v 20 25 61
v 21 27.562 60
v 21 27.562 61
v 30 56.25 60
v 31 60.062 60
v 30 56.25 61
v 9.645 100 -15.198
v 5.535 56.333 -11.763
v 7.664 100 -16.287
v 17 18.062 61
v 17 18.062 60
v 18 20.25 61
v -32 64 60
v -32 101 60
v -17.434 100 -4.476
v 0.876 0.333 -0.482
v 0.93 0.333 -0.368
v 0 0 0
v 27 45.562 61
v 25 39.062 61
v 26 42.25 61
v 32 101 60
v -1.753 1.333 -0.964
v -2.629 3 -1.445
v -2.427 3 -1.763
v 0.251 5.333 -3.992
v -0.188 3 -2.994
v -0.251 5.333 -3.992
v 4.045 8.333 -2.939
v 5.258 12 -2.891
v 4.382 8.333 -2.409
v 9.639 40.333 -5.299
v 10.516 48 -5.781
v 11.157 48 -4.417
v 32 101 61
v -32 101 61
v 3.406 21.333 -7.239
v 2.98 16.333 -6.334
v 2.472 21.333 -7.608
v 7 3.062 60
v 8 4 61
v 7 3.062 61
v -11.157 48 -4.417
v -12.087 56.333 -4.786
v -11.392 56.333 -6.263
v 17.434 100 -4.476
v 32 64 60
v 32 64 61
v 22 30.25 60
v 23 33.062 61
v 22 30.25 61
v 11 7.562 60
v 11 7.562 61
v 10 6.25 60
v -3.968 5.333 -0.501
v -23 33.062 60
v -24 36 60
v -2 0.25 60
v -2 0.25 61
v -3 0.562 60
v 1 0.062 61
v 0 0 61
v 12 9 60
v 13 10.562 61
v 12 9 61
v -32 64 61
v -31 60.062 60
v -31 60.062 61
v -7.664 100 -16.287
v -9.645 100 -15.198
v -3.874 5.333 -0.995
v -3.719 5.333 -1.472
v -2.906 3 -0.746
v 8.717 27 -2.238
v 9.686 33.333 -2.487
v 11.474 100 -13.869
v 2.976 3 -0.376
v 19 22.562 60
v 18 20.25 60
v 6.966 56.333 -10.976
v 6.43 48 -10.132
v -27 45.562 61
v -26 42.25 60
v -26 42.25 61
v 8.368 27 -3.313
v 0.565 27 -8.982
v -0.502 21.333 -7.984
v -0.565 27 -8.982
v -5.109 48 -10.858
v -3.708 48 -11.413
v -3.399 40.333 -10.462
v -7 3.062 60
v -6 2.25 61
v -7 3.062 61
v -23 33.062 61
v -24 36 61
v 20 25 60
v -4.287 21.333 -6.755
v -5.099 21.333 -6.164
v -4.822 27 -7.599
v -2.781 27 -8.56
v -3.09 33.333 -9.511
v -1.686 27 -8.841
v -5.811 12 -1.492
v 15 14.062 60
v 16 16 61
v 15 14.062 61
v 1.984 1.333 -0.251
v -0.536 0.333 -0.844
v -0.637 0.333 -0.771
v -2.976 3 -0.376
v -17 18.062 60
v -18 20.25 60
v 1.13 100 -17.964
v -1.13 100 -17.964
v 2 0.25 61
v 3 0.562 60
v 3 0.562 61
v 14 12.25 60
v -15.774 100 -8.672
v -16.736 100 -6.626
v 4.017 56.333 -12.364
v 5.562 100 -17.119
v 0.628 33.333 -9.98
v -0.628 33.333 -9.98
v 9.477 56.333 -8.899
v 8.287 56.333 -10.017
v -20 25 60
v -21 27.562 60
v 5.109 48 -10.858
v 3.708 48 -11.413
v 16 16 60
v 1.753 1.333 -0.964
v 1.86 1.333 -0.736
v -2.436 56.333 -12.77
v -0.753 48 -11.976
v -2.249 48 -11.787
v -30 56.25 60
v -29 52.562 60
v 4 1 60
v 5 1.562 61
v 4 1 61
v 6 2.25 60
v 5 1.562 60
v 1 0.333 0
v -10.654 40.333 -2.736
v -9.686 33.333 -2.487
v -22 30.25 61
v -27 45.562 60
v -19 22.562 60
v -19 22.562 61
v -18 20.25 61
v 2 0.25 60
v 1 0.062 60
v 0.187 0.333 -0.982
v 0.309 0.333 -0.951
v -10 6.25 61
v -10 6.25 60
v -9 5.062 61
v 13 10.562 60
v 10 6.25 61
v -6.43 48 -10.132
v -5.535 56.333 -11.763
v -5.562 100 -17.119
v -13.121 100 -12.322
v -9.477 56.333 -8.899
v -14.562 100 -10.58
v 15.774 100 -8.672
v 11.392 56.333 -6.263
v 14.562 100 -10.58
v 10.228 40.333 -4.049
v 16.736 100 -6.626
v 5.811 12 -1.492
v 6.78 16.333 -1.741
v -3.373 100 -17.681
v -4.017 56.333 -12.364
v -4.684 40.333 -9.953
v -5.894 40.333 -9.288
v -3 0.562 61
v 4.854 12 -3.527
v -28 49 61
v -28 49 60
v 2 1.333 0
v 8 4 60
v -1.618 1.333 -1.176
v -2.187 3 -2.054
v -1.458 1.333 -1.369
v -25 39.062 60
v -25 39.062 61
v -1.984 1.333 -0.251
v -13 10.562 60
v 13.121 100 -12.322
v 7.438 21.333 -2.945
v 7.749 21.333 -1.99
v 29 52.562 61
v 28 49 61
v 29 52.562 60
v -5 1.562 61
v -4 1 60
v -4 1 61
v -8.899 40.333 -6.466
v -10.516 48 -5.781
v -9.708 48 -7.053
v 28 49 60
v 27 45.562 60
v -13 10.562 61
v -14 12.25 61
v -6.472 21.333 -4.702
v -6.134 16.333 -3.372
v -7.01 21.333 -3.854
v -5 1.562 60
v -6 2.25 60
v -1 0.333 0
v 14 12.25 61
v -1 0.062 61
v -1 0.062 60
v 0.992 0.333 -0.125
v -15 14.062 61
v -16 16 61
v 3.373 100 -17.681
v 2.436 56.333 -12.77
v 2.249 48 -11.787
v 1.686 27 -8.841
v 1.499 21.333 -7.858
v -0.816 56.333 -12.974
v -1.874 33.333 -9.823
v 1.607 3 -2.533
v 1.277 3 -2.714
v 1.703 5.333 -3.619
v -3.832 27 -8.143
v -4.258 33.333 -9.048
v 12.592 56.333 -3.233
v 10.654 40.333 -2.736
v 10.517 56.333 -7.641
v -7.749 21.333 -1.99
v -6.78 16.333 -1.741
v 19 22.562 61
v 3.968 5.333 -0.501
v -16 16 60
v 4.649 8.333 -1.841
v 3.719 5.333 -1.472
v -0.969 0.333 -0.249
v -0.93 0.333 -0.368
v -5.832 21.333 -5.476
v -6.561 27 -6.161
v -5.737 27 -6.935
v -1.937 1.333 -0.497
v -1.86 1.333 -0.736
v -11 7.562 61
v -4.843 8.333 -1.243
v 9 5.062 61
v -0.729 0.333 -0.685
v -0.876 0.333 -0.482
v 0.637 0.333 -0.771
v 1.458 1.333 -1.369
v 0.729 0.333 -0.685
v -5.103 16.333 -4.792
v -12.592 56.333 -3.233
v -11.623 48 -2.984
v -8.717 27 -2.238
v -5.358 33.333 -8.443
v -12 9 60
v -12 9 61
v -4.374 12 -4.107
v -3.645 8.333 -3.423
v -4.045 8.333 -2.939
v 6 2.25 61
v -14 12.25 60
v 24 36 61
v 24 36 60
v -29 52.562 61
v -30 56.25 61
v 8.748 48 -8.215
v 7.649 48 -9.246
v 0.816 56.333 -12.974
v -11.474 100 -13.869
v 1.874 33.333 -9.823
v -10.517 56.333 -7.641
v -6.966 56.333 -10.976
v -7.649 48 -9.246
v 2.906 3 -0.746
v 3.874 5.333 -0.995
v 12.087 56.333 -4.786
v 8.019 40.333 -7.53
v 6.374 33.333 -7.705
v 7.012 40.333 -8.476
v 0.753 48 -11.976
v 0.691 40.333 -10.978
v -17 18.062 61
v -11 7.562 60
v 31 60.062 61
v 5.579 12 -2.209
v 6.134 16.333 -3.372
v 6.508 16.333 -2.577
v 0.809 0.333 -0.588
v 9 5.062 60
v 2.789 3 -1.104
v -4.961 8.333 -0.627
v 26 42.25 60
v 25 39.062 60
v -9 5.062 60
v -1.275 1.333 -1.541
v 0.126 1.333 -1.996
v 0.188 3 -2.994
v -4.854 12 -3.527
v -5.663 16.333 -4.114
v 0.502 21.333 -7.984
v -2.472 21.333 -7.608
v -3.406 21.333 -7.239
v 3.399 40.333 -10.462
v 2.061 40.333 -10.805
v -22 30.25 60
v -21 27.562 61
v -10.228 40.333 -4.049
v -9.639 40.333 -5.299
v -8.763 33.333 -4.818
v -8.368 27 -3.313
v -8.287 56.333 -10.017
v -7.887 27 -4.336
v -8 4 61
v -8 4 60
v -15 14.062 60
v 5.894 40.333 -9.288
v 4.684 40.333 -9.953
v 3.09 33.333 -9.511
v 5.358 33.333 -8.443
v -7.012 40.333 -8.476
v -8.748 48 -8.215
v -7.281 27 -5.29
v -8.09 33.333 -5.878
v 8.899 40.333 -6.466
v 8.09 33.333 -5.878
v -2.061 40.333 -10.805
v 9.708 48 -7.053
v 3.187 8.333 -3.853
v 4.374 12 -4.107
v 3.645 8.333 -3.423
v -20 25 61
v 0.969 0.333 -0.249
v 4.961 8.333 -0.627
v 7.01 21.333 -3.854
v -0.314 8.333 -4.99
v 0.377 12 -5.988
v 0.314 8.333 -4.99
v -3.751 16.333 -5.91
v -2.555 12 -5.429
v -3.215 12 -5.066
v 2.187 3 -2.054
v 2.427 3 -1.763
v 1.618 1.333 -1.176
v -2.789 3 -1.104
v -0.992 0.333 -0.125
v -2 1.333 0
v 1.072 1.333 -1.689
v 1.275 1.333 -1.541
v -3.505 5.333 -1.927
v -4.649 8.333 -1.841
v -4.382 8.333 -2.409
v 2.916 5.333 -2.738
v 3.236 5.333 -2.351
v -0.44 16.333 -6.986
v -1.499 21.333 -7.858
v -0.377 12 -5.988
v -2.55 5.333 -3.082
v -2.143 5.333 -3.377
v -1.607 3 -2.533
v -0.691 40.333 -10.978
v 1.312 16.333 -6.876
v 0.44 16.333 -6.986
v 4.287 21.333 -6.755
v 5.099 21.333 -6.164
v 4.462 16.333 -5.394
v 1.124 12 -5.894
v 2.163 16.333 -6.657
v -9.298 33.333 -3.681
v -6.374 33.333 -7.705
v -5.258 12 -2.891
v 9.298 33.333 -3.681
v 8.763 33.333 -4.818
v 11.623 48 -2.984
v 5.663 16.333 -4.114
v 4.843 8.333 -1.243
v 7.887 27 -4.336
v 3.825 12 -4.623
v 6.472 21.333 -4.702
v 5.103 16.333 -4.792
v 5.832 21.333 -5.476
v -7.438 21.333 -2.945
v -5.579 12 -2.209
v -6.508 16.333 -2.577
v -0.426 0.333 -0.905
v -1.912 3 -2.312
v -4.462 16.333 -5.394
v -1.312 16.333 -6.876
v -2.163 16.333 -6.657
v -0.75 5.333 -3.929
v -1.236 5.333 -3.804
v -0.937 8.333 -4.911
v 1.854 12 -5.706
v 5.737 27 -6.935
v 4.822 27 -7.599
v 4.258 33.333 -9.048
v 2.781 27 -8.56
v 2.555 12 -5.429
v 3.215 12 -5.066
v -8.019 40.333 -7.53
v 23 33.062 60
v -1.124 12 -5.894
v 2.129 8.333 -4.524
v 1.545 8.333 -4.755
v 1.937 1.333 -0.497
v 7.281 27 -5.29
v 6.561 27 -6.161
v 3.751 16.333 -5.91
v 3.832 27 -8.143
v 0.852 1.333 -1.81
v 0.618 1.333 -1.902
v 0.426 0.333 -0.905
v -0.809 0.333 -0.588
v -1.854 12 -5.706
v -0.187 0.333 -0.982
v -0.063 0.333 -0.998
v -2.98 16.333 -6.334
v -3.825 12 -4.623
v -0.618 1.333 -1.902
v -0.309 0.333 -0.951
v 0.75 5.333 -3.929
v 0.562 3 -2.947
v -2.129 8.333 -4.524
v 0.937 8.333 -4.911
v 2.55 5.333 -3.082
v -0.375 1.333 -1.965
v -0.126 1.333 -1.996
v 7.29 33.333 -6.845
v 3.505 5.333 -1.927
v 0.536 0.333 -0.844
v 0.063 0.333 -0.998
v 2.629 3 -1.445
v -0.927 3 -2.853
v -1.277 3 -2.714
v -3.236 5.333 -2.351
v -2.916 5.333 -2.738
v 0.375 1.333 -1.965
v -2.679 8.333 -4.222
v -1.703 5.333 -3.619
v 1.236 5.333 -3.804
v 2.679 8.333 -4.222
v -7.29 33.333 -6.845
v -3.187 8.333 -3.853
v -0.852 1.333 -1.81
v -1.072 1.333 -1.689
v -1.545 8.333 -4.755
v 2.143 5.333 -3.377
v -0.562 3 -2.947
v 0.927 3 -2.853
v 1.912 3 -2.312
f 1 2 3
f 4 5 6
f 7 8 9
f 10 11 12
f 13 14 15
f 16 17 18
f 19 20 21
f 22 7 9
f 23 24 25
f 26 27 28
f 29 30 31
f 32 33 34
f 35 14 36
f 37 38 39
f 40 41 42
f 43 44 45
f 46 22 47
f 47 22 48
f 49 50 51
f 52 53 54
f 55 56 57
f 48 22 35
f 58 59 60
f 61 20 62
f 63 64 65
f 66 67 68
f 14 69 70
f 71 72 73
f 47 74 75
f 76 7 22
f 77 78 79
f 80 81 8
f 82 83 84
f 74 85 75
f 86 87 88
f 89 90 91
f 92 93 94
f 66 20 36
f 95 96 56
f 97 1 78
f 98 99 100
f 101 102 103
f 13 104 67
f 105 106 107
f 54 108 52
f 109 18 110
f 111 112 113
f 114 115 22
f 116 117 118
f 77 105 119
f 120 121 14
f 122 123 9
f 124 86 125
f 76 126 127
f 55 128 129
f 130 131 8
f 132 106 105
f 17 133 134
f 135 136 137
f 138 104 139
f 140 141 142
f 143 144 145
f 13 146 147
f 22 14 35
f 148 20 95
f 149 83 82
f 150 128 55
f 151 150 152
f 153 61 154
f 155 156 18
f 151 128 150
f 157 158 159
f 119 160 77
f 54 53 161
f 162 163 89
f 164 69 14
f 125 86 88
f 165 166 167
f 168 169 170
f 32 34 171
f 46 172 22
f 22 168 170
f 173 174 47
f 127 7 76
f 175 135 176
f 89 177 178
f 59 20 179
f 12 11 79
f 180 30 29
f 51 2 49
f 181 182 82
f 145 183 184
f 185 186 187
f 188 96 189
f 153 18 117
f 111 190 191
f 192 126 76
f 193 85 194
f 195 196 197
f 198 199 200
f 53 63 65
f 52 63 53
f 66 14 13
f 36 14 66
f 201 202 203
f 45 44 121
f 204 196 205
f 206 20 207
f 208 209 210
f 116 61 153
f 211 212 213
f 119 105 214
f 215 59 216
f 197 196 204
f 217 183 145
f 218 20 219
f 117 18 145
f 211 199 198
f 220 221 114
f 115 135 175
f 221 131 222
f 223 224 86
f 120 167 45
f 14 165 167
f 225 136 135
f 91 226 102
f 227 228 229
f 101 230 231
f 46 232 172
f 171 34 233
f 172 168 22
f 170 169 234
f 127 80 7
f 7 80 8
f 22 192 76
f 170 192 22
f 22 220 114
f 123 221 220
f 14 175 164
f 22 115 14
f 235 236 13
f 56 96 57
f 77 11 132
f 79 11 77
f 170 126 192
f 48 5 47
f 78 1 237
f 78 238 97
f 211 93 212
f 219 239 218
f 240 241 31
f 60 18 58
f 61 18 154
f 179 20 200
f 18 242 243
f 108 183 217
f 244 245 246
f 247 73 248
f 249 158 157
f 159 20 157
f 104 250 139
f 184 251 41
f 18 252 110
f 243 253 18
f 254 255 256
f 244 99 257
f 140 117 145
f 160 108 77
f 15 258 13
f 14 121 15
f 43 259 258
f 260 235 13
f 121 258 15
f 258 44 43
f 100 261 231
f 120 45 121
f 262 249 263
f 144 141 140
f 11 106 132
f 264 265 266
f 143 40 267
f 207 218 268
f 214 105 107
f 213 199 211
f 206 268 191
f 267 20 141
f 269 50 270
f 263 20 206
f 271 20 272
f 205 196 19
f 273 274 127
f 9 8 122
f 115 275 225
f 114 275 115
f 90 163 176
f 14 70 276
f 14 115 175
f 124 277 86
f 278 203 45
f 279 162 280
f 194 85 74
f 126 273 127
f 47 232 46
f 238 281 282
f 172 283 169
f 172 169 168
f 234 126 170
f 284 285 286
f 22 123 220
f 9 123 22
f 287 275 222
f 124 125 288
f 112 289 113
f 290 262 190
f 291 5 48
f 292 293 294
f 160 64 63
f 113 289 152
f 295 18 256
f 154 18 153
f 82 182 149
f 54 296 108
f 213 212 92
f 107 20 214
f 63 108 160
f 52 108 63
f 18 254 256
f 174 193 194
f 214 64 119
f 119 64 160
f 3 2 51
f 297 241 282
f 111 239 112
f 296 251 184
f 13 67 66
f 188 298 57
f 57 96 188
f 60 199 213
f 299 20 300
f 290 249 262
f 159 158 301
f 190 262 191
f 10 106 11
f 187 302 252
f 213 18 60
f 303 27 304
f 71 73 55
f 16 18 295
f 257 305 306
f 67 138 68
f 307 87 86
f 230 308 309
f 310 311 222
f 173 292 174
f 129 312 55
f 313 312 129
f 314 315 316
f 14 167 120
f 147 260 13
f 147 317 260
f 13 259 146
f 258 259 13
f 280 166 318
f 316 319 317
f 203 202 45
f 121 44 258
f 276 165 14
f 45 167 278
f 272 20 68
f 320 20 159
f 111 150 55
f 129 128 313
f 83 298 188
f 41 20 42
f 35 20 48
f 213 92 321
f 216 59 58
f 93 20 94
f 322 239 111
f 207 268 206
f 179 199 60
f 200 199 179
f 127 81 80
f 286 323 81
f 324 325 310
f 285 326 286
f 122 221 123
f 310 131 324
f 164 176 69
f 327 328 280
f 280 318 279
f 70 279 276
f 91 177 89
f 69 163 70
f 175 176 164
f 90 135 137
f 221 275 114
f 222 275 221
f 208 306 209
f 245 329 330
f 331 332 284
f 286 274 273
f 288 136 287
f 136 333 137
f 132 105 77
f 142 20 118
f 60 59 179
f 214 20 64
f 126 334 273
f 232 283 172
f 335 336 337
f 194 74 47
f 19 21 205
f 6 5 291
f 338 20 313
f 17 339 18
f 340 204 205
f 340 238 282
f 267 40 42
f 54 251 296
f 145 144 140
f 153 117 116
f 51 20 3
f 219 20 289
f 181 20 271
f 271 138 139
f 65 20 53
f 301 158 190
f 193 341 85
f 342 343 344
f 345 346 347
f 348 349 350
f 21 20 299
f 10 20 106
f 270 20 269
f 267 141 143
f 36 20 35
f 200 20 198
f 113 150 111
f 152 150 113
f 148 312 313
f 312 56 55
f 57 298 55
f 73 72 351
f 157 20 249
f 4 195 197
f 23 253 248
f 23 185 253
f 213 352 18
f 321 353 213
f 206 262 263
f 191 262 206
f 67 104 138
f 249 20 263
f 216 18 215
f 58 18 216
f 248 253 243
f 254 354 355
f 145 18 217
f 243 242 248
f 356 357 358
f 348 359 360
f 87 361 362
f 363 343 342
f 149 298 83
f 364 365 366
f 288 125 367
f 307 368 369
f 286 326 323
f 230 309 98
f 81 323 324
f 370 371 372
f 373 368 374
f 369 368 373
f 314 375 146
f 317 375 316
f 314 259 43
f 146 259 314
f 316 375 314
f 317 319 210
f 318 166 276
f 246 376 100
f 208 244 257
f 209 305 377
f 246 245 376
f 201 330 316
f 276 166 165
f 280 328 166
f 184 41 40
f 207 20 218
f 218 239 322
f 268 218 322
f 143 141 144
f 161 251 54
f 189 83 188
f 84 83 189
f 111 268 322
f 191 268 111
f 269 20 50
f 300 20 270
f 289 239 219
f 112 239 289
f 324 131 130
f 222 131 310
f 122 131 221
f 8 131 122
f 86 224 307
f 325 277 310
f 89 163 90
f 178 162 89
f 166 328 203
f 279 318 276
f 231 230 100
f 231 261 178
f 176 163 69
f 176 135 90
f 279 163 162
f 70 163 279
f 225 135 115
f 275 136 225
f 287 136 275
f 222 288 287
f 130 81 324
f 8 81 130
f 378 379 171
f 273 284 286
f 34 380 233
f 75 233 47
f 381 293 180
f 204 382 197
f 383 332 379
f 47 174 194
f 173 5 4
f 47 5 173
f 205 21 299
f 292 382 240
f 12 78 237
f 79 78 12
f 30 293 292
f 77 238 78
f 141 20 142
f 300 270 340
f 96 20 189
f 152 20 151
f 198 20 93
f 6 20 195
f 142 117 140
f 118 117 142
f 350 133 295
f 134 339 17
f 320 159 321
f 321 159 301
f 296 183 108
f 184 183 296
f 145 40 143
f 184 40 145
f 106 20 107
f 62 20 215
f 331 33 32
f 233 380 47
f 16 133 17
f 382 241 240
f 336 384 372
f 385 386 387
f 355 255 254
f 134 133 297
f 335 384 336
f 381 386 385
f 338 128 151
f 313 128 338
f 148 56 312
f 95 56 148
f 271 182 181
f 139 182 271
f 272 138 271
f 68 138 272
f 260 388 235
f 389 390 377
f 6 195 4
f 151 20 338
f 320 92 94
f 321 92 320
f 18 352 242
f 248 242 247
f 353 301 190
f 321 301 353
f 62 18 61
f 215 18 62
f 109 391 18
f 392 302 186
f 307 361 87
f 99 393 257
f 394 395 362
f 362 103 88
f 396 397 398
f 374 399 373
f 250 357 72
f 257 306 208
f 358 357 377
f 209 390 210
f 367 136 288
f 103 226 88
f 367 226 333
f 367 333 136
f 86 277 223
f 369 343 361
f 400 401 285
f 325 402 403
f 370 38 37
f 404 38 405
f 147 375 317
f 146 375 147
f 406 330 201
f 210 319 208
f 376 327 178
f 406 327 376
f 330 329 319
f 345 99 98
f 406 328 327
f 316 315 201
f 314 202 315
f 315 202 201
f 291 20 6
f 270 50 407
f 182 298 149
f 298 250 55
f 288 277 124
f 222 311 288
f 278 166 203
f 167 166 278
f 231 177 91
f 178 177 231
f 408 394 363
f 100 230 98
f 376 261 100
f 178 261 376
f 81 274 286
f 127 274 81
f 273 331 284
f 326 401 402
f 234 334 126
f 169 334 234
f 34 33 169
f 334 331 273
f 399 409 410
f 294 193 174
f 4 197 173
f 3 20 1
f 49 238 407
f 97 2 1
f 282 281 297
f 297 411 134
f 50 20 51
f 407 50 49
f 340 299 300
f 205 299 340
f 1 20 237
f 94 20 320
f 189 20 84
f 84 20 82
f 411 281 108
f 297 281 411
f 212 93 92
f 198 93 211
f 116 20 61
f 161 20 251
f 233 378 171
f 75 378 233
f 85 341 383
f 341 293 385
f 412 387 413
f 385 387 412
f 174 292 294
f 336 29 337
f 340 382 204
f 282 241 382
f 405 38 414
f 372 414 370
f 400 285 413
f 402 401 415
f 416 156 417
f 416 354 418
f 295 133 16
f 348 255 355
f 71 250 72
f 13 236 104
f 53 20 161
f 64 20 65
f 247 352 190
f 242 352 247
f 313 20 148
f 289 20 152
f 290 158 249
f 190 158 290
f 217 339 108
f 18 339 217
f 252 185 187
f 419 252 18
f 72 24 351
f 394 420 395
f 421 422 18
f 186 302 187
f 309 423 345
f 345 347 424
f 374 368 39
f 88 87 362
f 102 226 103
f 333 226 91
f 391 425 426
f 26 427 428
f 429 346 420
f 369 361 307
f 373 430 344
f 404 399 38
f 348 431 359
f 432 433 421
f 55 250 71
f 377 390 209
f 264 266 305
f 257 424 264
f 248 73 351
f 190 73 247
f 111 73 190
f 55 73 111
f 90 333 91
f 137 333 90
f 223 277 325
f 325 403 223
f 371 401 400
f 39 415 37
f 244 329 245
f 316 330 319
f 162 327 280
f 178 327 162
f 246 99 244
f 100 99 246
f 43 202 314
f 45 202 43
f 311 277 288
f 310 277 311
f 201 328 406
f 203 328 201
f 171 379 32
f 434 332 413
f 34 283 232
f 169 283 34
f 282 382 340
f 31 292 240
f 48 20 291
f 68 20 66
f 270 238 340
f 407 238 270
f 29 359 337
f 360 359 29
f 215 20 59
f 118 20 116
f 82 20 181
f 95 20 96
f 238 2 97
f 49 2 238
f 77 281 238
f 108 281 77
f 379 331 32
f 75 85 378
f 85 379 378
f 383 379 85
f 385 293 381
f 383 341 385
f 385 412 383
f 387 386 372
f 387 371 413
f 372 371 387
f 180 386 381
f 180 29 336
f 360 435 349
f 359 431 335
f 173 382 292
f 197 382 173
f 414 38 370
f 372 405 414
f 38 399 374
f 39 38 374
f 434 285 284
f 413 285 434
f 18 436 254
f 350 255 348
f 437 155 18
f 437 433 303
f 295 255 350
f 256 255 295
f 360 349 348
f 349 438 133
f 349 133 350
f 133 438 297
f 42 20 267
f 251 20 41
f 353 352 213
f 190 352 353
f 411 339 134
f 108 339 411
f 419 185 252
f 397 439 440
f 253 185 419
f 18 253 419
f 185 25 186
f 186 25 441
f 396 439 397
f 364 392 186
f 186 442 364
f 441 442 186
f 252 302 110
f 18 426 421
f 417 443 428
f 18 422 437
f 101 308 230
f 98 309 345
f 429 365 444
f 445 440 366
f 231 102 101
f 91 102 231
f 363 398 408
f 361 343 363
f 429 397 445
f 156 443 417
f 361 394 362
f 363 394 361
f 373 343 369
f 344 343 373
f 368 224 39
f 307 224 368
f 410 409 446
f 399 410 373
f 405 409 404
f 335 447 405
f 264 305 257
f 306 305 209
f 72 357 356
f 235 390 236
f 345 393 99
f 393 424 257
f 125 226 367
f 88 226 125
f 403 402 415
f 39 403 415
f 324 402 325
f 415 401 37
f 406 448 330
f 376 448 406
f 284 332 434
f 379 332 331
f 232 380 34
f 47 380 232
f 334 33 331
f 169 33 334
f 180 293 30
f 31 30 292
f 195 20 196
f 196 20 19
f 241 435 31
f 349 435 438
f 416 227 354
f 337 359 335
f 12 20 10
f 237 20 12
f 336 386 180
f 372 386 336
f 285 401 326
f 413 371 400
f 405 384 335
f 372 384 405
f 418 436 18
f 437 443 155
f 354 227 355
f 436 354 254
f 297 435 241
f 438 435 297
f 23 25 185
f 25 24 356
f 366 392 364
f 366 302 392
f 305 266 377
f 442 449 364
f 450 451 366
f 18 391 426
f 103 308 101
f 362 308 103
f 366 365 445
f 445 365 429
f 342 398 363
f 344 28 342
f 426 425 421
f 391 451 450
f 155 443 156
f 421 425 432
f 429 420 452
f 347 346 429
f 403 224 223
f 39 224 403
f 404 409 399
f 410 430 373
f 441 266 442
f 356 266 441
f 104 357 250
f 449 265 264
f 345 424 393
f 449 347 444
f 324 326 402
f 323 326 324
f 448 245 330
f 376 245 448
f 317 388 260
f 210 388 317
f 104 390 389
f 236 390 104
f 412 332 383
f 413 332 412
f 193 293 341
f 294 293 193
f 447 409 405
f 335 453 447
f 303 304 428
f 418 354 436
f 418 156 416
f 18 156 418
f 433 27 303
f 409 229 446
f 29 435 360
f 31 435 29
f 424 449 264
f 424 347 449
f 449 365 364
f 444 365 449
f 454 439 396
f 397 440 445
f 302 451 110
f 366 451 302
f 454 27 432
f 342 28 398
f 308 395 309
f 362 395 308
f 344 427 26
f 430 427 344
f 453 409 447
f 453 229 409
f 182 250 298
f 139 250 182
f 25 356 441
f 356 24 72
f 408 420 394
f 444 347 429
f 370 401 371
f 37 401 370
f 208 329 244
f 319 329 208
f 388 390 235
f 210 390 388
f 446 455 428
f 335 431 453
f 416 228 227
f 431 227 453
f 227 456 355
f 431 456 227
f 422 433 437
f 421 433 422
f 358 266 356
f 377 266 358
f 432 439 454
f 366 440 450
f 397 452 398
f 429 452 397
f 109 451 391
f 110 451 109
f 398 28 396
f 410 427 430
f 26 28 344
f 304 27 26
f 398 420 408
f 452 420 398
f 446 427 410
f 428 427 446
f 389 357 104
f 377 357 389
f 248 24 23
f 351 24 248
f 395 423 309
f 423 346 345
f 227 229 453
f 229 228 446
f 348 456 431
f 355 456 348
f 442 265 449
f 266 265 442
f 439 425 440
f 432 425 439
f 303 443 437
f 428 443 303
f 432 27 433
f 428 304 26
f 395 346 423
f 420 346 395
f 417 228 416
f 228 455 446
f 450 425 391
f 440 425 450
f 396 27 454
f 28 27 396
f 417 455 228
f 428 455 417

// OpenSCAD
// file: variables.scad
// ##########################################//
// General
// ##########################################//
$fn = 50;
DIFFERENCE_FIX = 0.1;
DIFFERENCE_FIX_NEGATIVE = -1 * DIFFERENCE_FIX;
DIFFERENCE_FIX_2 = 2 * DIFFERENCE_FIX;

// ##########################################//
// Nose
// ##########################################//
noseTopThickness = 1;
noseTopOffsetZ = 60;
noseHeight = noseTopOffsetZ + noseTopThickness;
noseLength = 100;
noseTopEndOffset = 20;
noseTopSharpnessFactor = 4;
noseBotttomSharpnessFactor = 3;
noseTopThicknessFactor = 1;
noseBottomThicknessFactor = 3;

// ##########################################//
// Hull
// ##########################################//
hullThickness = 3;
hullWidth = 70 - hullThickness * 2;
hullLength = 500 - hullThickness * 2;
hullHeight = noseHeight + hullThickness;
hullSpacing = 100;
hullCutoutWidth = 46;
hullCutoutHeight = 150;

// ##########################################//
// Hull Mounts
// ##########################################//
hullMountHoleRadius = 4.25;
hullMountHeight = 20;
hullMountWidth = 20;
hullMountDepth = 50;
hullMountOffsetY = 100;

// ##########################################//
// Rod Connectors
// ##########################################//
rodConnectorWidth = 20;
rodConnectorRadius = 10;
rodConnectorTopOffset = 3;

// ##########################################//
// Lid
// ##########################################//
lidLip = 5;
lidThickness = 3;
lidGap = 0.4;
lidText = "+1 555 123 1234";
lidTextOffsetX = 28;
lidTextOffsetY = 20;

// ##########################################//
// Motor mount
// ##########################################//
motorMountMotorRadius = 35;
motorMountMotorDepth = 100;
motorMountThickness = 4;
motorMountMountThickness = 5;
motorMountMountOffsetX = 20;
motorMountSupportHeight = 10;
motorMountSupportExtensionY = 30;
motorMountOffsetY = 300;
motorMountRudderSupportHeight = 5;
motorMountRudderSupportWidth = 10;
motorMountRudderSupportExtensionY = 20;


// ##########################################//
// Rudder
// ##########################################//
rudderHeight = motorMountMotorRadius * 2 - 10;
rudderWidth = 60;
rudderThickness = 3;
rudderMountTopHeight = motorMountRudderSupportHeight + 1;
// main file
include <variables.scad>

module nose() {
    hull() {
        noseTop();
        noseBottom();
    }
}
nose();

module noseTop() {
    function parabolaTopFunc(x) = pow((x / noseTopSharpnessFactor), 2);
    function parabolaTop(x, ml) = parabolaTopFunc(x) > ml ? ml : parabolaTopFunc(x);

    points = [
        for (x = [-hullWidth / 2:hullWidth / 2]) [x, parabolaTop(x, noseLength - noseTopEndOffset)],
    ];

    hull() {
        translate([0, 0, noseTopOffsetZ])
        linear_extrude(noseTopThickness)
        polygon(points);

        translate([-hullWidth / 2, noseLength, noseTopOffsetZ])
        linear_extrude(noseTopThickness)
        square([hullWidth, 1]);
    }
}


module noseBottom() {
    function parabolaBottomFunc(x) = noseBottomThicknessFactor * pow((x / noseBotttomSharpnessFactor), 2);
    function parabolaBottom(x, ml) = parabolaBottomFunc(x) > ml ? ml : parabolaBottomFunc(x);

    points = [
        for (x = [0:hullWidth / 2]) [x, parabolaBottom(x, noseLength)],
        [0, noseLength]
    ];
    rotate([270, 0, 0]) rotate_extrude() polygon(points);
}

module noseTopLimit() {
    translate([-hullWidth / 2, 0, noseTopOffsetZ + noseTopThickness])
    cube([hullWidth, noseLength + 1, noseTopThickness * 5]);
}
